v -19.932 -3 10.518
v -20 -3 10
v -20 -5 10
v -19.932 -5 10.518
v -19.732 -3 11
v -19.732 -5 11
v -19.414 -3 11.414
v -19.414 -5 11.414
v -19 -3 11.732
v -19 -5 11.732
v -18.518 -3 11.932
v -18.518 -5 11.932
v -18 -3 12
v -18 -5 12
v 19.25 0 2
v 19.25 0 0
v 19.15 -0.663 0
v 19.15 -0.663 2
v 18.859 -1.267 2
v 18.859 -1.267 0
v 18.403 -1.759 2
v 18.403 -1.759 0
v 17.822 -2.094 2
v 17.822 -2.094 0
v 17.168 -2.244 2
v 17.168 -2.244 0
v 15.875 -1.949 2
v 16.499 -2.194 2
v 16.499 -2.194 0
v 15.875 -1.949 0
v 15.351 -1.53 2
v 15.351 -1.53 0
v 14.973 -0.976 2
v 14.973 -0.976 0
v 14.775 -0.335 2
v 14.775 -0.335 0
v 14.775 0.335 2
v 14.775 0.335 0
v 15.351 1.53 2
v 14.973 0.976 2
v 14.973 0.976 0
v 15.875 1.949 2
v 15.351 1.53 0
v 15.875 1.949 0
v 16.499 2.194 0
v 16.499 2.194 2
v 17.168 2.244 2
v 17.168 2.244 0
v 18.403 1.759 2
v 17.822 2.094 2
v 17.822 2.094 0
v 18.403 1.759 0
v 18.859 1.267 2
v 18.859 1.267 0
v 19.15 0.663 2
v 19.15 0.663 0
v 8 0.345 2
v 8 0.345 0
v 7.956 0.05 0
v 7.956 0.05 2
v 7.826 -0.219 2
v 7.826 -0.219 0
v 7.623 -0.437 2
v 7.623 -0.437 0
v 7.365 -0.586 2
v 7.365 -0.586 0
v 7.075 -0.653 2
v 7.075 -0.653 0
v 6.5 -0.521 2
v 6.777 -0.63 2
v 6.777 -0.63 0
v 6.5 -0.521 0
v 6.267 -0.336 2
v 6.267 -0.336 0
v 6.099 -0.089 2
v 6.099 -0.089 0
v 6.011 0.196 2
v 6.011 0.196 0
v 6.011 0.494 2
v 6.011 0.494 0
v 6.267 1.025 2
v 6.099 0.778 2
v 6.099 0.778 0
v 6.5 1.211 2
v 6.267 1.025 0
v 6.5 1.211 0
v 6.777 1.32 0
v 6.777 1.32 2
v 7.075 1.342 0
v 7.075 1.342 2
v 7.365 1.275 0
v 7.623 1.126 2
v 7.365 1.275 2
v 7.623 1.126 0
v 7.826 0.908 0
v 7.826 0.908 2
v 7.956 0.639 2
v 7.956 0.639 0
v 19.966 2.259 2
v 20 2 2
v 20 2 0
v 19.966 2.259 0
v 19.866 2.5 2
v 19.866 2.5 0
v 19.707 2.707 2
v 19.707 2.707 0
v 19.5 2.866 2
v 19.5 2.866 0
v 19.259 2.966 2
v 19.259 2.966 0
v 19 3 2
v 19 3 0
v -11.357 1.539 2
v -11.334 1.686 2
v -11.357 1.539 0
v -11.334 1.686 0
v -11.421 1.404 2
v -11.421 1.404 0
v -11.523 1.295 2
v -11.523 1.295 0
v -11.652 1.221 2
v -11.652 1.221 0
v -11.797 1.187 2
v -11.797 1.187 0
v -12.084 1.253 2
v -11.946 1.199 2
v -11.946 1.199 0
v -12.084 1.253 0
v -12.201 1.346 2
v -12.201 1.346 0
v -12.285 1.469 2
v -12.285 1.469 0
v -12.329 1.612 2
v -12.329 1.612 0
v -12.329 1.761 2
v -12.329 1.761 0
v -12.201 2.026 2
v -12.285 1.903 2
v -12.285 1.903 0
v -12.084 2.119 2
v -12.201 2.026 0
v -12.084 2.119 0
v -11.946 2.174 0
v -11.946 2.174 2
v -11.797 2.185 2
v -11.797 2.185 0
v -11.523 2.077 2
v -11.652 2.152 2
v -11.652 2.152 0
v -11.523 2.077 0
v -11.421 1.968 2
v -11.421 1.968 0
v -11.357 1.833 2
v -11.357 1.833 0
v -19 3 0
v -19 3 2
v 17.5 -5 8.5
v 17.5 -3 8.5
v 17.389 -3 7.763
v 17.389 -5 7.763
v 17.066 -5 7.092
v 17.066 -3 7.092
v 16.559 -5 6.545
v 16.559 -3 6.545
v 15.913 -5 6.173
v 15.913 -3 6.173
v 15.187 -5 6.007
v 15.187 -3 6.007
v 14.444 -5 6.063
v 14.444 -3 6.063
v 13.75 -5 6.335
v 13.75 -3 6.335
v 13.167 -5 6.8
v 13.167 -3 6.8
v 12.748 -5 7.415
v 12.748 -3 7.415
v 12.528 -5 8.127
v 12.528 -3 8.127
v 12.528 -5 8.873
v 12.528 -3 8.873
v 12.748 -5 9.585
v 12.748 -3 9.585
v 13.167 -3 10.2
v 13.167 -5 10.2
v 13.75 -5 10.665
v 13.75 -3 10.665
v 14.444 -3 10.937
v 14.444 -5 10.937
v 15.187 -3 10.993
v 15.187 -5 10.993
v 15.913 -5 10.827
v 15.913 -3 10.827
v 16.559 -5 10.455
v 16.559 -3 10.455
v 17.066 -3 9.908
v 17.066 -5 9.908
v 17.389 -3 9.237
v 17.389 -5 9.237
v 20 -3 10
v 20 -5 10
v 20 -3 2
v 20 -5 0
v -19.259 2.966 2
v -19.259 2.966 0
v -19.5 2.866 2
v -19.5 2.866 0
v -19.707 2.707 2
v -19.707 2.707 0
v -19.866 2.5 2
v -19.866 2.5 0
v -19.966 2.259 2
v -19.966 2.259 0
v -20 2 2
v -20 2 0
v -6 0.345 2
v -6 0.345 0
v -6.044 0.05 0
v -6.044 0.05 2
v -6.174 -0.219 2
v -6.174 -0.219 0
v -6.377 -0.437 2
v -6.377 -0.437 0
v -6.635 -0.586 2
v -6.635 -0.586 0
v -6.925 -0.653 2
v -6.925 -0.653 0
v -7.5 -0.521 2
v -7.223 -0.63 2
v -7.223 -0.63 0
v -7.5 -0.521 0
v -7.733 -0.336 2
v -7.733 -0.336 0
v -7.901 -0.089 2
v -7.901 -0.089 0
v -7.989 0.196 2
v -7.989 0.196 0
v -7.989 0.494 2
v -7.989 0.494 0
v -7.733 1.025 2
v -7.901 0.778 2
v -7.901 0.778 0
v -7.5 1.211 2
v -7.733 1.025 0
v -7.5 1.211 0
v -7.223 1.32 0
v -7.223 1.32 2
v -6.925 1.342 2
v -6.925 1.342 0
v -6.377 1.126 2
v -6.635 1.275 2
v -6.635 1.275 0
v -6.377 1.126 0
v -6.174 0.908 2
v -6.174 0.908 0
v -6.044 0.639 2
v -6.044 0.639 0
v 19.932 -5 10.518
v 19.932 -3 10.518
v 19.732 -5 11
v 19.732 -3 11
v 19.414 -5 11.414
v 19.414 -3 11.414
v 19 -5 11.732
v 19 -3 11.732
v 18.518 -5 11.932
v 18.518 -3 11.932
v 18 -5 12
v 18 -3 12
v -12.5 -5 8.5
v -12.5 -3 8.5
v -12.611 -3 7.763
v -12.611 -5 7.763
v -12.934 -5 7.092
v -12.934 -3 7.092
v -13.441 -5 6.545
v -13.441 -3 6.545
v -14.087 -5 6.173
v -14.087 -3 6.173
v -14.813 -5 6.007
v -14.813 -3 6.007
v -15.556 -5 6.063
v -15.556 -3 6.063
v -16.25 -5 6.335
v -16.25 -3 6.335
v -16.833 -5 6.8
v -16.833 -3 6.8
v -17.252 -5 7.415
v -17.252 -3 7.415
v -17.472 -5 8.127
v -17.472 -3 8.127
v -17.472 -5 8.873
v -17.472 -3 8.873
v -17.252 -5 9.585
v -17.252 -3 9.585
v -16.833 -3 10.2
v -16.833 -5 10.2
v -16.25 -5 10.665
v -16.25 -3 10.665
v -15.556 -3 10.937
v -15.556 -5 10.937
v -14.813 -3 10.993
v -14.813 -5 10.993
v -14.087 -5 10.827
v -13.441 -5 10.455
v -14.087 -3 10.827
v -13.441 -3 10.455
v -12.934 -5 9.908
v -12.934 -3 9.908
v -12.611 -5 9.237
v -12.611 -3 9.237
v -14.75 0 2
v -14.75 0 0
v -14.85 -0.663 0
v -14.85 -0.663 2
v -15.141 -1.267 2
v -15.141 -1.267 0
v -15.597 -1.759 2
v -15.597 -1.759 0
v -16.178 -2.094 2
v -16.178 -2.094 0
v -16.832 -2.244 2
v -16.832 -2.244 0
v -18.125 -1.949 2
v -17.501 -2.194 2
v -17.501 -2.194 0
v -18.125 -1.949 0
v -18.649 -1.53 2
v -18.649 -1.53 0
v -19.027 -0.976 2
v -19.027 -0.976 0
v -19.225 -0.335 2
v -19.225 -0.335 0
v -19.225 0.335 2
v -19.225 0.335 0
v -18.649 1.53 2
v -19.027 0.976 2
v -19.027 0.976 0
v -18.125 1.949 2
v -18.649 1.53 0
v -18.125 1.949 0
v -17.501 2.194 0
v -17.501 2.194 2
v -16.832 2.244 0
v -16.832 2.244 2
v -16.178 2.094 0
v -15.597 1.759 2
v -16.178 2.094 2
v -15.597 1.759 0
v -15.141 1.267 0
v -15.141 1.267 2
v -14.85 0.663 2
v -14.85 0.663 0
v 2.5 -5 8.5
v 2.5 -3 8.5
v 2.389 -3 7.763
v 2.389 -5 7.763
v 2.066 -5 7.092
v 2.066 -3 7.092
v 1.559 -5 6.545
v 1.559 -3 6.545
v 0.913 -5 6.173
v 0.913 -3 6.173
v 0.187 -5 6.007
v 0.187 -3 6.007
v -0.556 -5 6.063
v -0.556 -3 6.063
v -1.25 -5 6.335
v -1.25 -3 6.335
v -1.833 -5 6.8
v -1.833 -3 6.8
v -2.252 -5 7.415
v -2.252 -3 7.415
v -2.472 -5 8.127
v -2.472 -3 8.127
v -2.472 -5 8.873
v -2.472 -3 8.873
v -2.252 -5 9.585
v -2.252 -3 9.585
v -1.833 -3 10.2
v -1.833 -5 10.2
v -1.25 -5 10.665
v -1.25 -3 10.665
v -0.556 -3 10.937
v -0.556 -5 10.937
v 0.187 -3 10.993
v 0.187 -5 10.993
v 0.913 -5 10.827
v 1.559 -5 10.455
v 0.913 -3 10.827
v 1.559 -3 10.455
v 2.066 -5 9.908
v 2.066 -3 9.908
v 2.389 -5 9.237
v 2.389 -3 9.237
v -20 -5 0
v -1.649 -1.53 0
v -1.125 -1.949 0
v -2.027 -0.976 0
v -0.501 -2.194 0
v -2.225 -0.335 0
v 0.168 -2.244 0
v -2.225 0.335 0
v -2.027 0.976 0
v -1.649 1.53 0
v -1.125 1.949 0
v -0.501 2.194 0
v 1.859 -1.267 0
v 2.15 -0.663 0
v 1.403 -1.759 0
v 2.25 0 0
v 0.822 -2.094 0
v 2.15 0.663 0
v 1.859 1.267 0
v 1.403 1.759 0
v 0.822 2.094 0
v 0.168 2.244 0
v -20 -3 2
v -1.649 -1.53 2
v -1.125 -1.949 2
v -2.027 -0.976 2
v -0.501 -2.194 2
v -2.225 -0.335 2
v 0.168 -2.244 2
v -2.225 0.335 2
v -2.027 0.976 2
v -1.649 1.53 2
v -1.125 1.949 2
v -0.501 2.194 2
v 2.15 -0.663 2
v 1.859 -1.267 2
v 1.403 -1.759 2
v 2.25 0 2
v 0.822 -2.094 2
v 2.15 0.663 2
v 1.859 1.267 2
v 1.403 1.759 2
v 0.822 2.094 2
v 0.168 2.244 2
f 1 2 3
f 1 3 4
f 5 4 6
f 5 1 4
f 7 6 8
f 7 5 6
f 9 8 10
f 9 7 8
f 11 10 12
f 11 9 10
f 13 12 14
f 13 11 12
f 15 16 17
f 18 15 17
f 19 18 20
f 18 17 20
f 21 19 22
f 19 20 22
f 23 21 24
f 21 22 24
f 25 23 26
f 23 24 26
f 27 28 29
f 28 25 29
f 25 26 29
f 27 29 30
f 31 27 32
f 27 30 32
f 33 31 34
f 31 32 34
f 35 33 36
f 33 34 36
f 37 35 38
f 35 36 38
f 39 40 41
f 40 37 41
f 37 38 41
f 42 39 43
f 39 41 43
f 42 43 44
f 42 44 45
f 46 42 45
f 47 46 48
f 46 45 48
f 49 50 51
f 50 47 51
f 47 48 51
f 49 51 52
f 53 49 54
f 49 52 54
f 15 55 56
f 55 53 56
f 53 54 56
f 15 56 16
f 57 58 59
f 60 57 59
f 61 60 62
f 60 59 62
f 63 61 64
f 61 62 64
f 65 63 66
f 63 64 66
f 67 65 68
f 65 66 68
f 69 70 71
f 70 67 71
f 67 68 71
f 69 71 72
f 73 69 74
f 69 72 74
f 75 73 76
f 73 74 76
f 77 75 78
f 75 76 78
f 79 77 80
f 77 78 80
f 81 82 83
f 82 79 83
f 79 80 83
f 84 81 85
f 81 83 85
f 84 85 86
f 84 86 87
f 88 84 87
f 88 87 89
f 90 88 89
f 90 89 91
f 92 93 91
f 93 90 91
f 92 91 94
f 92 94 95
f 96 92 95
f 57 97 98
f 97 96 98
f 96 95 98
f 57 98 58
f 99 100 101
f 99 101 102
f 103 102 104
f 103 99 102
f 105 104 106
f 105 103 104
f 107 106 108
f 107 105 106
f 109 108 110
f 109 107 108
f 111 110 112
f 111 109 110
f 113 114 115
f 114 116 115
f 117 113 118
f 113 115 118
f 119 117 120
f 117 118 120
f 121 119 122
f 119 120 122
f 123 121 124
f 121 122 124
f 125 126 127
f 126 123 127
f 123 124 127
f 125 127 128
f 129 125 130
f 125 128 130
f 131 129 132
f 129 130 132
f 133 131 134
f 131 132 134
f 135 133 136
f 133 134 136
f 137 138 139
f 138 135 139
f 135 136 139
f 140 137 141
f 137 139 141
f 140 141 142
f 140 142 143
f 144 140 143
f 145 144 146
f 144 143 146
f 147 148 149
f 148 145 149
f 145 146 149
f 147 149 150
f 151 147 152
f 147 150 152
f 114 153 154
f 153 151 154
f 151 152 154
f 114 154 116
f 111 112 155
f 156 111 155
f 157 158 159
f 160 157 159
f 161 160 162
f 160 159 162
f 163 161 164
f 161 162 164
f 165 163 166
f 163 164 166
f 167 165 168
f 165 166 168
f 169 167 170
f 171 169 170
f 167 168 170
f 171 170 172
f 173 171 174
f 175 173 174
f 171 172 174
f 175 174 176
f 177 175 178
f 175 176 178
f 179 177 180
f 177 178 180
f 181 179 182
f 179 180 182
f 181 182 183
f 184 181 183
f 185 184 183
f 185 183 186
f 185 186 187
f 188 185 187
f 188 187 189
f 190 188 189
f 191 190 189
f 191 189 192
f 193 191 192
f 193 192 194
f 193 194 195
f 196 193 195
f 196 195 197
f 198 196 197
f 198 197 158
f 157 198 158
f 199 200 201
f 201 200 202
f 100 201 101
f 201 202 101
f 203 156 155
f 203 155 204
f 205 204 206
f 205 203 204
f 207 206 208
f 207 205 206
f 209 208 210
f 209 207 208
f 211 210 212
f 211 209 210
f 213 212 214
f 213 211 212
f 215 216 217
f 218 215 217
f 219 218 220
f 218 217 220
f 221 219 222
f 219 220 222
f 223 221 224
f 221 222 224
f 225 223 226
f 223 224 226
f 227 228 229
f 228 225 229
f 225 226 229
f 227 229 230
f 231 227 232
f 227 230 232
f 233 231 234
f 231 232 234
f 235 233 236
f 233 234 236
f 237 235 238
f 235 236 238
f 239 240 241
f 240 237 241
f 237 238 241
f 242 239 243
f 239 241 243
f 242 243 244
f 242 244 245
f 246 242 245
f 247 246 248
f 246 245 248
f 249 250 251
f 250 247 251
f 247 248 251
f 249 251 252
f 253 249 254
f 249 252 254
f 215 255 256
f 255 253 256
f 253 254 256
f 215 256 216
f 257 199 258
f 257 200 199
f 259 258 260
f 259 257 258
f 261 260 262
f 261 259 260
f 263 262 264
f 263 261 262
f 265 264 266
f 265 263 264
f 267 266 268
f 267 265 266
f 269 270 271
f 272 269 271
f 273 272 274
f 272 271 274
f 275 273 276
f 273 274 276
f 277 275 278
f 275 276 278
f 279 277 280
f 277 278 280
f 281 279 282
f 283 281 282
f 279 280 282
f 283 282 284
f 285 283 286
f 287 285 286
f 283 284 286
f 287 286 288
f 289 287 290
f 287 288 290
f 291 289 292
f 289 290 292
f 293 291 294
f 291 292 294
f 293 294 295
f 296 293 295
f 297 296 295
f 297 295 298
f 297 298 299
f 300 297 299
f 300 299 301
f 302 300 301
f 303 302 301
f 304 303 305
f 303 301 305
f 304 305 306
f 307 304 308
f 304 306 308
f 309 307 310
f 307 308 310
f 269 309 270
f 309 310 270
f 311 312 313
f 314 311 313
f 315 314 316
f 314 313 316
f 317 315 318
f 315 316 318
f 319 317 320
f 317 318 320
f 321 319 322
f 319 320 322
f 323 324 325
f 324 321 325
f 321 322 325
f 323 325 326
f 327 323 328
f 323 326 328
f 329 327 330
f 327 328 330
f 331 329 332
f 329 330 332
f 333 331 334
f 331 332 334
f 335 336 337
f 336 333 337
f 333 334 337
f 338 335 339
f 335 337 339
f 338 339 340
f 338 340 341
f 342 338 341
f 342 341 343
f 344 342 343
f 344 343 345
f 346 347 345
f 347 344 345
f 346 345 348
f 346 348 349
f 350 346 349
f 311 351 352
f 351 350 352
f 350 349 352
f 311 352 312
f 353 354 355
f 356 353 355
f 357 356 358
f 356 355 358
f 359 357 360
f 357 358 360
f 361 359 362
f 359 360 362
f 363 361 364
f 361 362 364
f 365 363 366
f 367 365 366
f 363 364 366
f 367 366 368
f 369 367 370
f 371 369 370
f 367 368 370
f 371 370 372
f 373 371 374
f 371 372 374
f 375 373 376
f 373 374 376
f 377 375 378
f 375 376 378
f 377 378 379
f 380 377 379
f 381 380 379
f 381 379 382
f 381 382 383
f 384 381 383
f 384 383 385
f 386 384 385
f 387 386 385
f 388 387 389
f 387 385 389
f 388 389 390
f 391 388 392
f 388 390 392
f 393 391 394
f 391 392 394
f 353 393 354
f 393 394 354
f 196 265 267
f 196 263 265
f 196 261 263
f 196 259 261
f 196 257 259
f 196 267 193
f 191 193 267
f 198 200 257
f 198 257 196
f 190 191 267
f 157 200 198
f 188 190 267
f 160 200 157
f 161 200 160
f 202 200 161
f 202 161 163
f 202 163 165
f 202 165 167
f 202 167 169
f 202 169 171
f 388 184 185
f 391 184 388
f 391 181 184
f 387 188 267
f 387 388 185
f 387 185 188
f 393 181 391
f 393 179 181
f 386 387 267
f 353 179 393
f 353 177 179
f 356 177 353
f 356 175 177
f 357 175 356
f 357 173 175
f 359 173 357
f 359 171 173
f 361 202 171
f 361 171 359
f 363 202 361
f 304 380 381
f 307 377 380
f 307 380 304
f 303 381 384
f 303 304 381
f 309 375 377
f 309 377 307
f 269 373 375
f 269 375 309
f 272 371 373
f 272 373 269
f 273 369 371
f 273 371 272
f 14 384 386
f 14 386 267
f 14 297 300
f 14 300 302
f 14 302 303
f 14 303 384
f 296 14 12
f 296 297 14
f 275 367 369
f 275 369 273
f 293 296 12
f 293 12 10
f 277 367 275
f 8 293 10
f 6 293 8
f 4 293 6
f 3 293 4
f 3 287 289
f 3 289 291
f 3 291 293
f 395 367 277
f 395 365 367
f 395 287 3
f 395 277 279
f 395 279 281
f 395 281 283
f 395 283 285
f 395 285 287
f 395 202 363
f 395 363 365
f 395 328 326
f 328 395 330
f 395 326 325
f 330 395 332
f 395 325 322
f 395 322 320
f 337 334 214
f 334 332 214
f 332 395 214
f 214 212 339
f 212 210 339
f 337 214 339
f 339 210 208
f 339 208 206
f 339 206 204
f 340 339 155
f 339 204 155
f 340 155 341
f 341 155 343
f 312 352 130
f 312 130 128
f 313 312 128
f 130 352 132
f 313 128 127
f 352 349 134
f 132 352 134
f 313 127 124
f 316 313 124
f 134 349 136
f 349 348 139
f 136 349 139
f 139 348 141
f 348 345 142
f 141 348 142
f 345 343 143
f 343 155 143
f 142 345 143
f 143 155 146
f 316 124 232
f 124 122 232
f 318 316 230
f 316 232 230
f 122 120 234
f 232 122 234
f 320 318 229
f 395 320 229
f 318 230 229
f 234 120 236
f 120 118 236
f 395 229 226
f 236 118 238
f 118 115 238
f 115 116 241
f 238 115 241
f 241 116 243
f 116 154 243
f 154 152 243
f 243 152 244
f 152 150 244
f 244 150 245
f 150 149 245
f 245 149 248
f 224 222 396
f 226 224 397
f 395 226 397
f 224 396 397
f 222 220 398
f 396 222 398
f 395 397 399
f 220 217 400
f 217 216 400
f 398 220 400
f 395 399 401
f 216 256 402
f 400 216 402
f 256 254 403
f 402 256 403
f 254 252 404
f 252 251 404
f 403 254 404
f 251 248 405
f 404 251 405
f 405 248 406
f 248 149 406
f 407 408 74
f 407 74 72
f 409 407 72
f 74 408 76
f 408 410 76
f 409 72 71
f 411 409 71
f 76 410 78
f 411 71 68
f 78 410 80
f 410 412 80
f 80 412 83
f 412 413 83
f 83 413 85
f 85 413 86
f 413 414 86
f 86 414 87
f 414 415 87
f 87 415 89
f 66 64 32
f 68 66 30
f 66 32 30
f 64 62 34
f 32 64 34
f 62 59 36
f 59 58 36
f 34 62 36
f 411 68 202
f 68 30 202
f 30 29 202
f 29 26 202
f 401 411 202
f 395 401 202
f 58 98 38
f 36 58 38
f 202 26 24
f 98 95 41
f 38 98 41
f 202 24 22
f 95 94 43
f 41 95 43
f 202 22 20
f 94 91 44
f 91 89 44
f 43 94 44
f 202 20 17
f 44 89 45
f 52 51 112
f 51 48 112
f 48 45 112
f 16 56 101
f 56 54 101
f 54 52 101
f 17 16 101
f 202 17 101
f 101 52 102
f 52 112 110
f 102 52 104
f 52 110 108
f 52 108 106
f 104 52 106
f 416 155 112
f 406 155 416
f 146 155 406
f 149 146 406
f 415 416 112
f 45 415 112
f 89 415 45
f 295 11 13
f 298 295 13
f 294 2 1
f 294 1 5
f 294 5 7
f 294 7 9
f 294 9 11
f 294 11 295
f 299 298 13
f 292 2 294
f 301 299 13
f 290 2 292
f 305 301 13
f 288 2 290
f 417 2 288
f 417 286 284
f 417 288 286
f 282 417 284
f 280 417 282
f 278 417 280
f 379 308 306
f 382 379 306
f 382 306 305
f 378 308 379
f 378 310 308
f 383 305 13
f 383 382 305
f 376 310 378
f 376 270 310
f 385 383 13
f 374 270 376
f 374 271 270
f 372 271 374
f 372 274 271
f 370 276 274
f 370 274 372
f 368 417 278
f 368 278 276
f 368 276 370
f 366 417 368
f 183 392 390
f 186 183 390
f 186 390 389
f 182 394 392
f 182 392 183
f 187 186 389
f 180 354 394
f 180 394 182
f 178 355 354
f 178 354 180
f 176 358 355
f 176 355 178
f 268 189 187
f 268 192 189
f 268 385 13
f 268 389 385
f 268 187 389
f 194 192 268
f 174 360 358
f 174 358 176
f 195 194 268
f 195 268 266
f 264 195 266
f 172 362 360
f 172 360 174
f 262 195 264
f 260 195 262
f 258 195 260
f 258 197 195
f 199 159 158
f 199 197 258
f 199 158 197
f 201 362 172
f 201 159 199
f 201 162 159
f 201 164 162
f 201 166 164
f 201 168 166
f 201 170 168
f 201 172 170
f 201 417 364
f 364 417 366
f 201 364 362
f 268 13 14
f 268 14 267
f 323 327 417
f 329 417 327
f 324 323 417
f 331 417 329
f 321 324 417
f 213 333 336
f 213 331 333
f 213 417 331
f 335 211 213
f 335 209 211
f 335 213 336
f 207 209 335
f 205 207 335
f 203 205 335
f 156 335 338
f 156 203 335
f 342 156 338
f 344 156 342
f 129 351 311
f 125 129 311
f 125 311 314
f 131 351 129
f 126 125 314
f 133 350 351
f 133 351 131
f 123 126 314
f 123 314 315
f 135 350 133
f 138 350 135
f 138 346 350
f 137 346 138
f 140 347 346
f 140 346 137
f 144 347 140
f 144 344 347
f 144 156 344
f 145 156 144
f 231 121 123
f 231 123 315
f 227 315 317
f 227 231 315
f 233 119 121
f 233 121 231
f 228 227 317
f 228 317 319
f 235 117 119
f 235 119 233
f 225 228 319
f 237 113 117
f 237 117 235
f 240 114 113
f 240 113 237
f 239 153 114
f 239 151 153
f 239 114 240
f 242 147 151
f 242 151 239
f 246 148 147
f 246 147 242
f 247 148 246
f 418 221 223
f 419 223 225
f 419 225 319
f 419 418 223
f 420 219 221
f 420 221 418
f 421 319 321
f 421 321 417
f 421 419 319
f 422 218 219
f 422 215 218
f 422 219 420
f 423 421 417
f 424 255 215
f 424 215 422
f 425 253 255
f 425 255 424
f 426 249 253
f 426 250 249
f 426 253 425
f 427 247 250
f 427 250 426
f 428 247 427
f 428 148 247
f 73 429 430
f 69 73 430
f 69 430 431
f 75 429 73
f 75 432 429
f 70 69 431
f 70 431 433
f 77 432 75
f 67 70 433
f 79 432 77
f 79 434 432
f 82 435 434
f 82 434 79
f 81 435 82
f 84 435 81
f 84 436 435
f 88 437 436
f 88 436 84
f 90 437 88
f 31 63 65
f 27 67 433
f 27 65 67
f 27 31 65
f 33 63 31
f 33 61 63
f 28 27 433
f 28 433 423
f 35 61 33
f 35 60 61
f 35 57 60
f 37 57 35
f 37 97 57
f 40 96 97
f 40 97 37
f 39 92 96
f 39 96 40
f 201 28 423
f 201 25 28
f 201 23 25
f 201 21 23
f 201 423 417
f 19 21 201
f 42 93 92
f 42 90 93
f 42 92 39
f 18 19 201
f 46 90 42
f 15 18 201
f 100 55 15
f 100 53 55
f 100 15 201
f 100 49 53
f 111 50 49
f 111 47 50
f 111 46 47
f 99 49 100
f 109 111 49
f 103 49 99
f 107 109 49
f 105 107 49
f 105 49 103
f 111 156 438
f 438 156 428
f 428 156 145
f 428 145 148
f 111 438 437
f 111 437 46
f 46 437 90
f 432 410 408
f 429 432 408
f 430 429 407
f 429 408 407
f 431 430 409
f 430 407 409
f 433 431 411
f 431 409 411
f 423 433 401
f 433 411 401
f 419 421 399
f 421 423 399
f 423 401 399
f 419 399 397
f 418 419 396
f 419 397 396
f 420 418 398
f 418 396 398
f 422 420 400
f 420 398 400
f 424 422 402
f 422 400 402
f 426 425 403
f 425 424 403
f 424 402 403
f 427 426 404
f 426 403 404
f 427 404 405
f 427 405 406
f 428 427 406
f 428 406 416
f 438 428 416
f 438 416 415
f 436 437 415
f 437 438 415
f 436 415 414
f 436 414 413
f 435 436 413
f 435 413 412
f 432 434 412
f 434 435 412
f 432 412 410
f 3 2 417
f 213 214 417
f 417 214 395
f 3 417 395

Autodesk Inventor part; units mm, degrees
ref_plane "YZ Plane" through (0, 0, 0) normal (1, 0, 0) x (0, 1, 0)
ref_plane "XZ Plane" through (0, 0, 0) normal (0, 1, 0) x (-1, 0, 0)
ref_plane "XY Plane" through (0, 0, 0) normal (0, 0, 1) x (1, 0, 0)
sketch "Sketch1" plane through (0, 0, 0) normal (0, 0, 1) x (1, 0, 0)
  line L0 (-20, -3) -> (20, -3) construction
  circle A0 centre (-17, 0) radius 2.25
  circle A1 centre (17, 0) radius 2.25
  circle A2 centre (0, 0) radius 2.25
  circle A3 centre (-7, 0.3446) radius 1
  circle A4 centre (7, 0.3446) radius 1
  line L1 (-23.9554, 0) -> (25.6733, 0) construction
  line L2 (0, 11.421) -> (0, -11.2937) construction
  line L3 (-20, -3) -> (20, -3)
  line L4 (20, -3) -> (20, 3)
  line L5 (20, 3) -> (-20, 3)
  line L6 (-20, 3) -> (-20, -3)
  circle A5 centre (-11.8345, 1.6861) radius 0.5
  line L7 (-20, -3) -> (20, -3)
  line L8 (20, -3) -> (20, -5)
  line L9 (20, -5) -> (-20, -5)
  line L10 (-20, -5) -> (-20, -3)
  point P0 (0, 0)
  point P1 (0, -3)
  point P2 (0, -3)
  point P3 (-2.8751, -5.808)
  point P4 (2.8751, -5.808)
  dimension "d0" = 40
  dimension "d1" = 4.5
  dimension "d2" = 4.5
  dimension "d3" = 3
  dimension "d4" = 4.5
  dimension "d5" = 3
  dimension "d6" = 3.3446
  dimension "d7" = 3.3446
  dimension "d8" = 3
  dimension "d9" = 17
  dimension "d10" = 17
  dimension "d11" = 3
  dimension "d12" = 3
  dimension "d13" = 3
  dimension "d14" = 3
  dimension "d16" = 1
  dimension "d20" = 2
extrude "Extrusion1" add sketch "Sketch1" along normal blind 2 contours L6 L5 L4 L3
extrude "Extrusion2" add sketch "Sketch1" along normal blind 12 contours L3 L8 L9 L10
sketch "Sketch2" plane through (-20, -3, 2) normal (0, 1, 0) x (1, 0, 0)
  line L0 (0, 0) -> (40, 0) projected
  line L1 (0, 0) -> (0, -10)
  line L2 (40, -10) -> (0, -10) projected
  line L3 (40, 0) -> (40, -10)
  circle A0 centre (5, -6.5) radius 2.5
  circle A1 centre (35, -6.5) radius 2.5
  line L4 (20, 0) -> (20, -10) construction
  line L5 (0, -6.5) -> (40, -6.5) construction
  circle A2 centre (20, -6.5) radius 2.5
  point P0 (20, 2)
  dimension "d24" = 5
  dimension "d25" = 5
  dimension "d26" = 15
  dimension "d27" = 15
  dimension "d28" = 3.5
  dimension "d29" = 5
extrude "Extrusion3" cut sketch "Sketch2" against normal blind 7 contours A0 | A1 | A2
fillet "Fillet2" radius 2 2 edges at (20, -4, 12) (-20, -4, 12)
fillet "Fillet3" radius 1 2 edges at (20, 3, 1) (-20, 3, 1)
properties part number "Bar"
